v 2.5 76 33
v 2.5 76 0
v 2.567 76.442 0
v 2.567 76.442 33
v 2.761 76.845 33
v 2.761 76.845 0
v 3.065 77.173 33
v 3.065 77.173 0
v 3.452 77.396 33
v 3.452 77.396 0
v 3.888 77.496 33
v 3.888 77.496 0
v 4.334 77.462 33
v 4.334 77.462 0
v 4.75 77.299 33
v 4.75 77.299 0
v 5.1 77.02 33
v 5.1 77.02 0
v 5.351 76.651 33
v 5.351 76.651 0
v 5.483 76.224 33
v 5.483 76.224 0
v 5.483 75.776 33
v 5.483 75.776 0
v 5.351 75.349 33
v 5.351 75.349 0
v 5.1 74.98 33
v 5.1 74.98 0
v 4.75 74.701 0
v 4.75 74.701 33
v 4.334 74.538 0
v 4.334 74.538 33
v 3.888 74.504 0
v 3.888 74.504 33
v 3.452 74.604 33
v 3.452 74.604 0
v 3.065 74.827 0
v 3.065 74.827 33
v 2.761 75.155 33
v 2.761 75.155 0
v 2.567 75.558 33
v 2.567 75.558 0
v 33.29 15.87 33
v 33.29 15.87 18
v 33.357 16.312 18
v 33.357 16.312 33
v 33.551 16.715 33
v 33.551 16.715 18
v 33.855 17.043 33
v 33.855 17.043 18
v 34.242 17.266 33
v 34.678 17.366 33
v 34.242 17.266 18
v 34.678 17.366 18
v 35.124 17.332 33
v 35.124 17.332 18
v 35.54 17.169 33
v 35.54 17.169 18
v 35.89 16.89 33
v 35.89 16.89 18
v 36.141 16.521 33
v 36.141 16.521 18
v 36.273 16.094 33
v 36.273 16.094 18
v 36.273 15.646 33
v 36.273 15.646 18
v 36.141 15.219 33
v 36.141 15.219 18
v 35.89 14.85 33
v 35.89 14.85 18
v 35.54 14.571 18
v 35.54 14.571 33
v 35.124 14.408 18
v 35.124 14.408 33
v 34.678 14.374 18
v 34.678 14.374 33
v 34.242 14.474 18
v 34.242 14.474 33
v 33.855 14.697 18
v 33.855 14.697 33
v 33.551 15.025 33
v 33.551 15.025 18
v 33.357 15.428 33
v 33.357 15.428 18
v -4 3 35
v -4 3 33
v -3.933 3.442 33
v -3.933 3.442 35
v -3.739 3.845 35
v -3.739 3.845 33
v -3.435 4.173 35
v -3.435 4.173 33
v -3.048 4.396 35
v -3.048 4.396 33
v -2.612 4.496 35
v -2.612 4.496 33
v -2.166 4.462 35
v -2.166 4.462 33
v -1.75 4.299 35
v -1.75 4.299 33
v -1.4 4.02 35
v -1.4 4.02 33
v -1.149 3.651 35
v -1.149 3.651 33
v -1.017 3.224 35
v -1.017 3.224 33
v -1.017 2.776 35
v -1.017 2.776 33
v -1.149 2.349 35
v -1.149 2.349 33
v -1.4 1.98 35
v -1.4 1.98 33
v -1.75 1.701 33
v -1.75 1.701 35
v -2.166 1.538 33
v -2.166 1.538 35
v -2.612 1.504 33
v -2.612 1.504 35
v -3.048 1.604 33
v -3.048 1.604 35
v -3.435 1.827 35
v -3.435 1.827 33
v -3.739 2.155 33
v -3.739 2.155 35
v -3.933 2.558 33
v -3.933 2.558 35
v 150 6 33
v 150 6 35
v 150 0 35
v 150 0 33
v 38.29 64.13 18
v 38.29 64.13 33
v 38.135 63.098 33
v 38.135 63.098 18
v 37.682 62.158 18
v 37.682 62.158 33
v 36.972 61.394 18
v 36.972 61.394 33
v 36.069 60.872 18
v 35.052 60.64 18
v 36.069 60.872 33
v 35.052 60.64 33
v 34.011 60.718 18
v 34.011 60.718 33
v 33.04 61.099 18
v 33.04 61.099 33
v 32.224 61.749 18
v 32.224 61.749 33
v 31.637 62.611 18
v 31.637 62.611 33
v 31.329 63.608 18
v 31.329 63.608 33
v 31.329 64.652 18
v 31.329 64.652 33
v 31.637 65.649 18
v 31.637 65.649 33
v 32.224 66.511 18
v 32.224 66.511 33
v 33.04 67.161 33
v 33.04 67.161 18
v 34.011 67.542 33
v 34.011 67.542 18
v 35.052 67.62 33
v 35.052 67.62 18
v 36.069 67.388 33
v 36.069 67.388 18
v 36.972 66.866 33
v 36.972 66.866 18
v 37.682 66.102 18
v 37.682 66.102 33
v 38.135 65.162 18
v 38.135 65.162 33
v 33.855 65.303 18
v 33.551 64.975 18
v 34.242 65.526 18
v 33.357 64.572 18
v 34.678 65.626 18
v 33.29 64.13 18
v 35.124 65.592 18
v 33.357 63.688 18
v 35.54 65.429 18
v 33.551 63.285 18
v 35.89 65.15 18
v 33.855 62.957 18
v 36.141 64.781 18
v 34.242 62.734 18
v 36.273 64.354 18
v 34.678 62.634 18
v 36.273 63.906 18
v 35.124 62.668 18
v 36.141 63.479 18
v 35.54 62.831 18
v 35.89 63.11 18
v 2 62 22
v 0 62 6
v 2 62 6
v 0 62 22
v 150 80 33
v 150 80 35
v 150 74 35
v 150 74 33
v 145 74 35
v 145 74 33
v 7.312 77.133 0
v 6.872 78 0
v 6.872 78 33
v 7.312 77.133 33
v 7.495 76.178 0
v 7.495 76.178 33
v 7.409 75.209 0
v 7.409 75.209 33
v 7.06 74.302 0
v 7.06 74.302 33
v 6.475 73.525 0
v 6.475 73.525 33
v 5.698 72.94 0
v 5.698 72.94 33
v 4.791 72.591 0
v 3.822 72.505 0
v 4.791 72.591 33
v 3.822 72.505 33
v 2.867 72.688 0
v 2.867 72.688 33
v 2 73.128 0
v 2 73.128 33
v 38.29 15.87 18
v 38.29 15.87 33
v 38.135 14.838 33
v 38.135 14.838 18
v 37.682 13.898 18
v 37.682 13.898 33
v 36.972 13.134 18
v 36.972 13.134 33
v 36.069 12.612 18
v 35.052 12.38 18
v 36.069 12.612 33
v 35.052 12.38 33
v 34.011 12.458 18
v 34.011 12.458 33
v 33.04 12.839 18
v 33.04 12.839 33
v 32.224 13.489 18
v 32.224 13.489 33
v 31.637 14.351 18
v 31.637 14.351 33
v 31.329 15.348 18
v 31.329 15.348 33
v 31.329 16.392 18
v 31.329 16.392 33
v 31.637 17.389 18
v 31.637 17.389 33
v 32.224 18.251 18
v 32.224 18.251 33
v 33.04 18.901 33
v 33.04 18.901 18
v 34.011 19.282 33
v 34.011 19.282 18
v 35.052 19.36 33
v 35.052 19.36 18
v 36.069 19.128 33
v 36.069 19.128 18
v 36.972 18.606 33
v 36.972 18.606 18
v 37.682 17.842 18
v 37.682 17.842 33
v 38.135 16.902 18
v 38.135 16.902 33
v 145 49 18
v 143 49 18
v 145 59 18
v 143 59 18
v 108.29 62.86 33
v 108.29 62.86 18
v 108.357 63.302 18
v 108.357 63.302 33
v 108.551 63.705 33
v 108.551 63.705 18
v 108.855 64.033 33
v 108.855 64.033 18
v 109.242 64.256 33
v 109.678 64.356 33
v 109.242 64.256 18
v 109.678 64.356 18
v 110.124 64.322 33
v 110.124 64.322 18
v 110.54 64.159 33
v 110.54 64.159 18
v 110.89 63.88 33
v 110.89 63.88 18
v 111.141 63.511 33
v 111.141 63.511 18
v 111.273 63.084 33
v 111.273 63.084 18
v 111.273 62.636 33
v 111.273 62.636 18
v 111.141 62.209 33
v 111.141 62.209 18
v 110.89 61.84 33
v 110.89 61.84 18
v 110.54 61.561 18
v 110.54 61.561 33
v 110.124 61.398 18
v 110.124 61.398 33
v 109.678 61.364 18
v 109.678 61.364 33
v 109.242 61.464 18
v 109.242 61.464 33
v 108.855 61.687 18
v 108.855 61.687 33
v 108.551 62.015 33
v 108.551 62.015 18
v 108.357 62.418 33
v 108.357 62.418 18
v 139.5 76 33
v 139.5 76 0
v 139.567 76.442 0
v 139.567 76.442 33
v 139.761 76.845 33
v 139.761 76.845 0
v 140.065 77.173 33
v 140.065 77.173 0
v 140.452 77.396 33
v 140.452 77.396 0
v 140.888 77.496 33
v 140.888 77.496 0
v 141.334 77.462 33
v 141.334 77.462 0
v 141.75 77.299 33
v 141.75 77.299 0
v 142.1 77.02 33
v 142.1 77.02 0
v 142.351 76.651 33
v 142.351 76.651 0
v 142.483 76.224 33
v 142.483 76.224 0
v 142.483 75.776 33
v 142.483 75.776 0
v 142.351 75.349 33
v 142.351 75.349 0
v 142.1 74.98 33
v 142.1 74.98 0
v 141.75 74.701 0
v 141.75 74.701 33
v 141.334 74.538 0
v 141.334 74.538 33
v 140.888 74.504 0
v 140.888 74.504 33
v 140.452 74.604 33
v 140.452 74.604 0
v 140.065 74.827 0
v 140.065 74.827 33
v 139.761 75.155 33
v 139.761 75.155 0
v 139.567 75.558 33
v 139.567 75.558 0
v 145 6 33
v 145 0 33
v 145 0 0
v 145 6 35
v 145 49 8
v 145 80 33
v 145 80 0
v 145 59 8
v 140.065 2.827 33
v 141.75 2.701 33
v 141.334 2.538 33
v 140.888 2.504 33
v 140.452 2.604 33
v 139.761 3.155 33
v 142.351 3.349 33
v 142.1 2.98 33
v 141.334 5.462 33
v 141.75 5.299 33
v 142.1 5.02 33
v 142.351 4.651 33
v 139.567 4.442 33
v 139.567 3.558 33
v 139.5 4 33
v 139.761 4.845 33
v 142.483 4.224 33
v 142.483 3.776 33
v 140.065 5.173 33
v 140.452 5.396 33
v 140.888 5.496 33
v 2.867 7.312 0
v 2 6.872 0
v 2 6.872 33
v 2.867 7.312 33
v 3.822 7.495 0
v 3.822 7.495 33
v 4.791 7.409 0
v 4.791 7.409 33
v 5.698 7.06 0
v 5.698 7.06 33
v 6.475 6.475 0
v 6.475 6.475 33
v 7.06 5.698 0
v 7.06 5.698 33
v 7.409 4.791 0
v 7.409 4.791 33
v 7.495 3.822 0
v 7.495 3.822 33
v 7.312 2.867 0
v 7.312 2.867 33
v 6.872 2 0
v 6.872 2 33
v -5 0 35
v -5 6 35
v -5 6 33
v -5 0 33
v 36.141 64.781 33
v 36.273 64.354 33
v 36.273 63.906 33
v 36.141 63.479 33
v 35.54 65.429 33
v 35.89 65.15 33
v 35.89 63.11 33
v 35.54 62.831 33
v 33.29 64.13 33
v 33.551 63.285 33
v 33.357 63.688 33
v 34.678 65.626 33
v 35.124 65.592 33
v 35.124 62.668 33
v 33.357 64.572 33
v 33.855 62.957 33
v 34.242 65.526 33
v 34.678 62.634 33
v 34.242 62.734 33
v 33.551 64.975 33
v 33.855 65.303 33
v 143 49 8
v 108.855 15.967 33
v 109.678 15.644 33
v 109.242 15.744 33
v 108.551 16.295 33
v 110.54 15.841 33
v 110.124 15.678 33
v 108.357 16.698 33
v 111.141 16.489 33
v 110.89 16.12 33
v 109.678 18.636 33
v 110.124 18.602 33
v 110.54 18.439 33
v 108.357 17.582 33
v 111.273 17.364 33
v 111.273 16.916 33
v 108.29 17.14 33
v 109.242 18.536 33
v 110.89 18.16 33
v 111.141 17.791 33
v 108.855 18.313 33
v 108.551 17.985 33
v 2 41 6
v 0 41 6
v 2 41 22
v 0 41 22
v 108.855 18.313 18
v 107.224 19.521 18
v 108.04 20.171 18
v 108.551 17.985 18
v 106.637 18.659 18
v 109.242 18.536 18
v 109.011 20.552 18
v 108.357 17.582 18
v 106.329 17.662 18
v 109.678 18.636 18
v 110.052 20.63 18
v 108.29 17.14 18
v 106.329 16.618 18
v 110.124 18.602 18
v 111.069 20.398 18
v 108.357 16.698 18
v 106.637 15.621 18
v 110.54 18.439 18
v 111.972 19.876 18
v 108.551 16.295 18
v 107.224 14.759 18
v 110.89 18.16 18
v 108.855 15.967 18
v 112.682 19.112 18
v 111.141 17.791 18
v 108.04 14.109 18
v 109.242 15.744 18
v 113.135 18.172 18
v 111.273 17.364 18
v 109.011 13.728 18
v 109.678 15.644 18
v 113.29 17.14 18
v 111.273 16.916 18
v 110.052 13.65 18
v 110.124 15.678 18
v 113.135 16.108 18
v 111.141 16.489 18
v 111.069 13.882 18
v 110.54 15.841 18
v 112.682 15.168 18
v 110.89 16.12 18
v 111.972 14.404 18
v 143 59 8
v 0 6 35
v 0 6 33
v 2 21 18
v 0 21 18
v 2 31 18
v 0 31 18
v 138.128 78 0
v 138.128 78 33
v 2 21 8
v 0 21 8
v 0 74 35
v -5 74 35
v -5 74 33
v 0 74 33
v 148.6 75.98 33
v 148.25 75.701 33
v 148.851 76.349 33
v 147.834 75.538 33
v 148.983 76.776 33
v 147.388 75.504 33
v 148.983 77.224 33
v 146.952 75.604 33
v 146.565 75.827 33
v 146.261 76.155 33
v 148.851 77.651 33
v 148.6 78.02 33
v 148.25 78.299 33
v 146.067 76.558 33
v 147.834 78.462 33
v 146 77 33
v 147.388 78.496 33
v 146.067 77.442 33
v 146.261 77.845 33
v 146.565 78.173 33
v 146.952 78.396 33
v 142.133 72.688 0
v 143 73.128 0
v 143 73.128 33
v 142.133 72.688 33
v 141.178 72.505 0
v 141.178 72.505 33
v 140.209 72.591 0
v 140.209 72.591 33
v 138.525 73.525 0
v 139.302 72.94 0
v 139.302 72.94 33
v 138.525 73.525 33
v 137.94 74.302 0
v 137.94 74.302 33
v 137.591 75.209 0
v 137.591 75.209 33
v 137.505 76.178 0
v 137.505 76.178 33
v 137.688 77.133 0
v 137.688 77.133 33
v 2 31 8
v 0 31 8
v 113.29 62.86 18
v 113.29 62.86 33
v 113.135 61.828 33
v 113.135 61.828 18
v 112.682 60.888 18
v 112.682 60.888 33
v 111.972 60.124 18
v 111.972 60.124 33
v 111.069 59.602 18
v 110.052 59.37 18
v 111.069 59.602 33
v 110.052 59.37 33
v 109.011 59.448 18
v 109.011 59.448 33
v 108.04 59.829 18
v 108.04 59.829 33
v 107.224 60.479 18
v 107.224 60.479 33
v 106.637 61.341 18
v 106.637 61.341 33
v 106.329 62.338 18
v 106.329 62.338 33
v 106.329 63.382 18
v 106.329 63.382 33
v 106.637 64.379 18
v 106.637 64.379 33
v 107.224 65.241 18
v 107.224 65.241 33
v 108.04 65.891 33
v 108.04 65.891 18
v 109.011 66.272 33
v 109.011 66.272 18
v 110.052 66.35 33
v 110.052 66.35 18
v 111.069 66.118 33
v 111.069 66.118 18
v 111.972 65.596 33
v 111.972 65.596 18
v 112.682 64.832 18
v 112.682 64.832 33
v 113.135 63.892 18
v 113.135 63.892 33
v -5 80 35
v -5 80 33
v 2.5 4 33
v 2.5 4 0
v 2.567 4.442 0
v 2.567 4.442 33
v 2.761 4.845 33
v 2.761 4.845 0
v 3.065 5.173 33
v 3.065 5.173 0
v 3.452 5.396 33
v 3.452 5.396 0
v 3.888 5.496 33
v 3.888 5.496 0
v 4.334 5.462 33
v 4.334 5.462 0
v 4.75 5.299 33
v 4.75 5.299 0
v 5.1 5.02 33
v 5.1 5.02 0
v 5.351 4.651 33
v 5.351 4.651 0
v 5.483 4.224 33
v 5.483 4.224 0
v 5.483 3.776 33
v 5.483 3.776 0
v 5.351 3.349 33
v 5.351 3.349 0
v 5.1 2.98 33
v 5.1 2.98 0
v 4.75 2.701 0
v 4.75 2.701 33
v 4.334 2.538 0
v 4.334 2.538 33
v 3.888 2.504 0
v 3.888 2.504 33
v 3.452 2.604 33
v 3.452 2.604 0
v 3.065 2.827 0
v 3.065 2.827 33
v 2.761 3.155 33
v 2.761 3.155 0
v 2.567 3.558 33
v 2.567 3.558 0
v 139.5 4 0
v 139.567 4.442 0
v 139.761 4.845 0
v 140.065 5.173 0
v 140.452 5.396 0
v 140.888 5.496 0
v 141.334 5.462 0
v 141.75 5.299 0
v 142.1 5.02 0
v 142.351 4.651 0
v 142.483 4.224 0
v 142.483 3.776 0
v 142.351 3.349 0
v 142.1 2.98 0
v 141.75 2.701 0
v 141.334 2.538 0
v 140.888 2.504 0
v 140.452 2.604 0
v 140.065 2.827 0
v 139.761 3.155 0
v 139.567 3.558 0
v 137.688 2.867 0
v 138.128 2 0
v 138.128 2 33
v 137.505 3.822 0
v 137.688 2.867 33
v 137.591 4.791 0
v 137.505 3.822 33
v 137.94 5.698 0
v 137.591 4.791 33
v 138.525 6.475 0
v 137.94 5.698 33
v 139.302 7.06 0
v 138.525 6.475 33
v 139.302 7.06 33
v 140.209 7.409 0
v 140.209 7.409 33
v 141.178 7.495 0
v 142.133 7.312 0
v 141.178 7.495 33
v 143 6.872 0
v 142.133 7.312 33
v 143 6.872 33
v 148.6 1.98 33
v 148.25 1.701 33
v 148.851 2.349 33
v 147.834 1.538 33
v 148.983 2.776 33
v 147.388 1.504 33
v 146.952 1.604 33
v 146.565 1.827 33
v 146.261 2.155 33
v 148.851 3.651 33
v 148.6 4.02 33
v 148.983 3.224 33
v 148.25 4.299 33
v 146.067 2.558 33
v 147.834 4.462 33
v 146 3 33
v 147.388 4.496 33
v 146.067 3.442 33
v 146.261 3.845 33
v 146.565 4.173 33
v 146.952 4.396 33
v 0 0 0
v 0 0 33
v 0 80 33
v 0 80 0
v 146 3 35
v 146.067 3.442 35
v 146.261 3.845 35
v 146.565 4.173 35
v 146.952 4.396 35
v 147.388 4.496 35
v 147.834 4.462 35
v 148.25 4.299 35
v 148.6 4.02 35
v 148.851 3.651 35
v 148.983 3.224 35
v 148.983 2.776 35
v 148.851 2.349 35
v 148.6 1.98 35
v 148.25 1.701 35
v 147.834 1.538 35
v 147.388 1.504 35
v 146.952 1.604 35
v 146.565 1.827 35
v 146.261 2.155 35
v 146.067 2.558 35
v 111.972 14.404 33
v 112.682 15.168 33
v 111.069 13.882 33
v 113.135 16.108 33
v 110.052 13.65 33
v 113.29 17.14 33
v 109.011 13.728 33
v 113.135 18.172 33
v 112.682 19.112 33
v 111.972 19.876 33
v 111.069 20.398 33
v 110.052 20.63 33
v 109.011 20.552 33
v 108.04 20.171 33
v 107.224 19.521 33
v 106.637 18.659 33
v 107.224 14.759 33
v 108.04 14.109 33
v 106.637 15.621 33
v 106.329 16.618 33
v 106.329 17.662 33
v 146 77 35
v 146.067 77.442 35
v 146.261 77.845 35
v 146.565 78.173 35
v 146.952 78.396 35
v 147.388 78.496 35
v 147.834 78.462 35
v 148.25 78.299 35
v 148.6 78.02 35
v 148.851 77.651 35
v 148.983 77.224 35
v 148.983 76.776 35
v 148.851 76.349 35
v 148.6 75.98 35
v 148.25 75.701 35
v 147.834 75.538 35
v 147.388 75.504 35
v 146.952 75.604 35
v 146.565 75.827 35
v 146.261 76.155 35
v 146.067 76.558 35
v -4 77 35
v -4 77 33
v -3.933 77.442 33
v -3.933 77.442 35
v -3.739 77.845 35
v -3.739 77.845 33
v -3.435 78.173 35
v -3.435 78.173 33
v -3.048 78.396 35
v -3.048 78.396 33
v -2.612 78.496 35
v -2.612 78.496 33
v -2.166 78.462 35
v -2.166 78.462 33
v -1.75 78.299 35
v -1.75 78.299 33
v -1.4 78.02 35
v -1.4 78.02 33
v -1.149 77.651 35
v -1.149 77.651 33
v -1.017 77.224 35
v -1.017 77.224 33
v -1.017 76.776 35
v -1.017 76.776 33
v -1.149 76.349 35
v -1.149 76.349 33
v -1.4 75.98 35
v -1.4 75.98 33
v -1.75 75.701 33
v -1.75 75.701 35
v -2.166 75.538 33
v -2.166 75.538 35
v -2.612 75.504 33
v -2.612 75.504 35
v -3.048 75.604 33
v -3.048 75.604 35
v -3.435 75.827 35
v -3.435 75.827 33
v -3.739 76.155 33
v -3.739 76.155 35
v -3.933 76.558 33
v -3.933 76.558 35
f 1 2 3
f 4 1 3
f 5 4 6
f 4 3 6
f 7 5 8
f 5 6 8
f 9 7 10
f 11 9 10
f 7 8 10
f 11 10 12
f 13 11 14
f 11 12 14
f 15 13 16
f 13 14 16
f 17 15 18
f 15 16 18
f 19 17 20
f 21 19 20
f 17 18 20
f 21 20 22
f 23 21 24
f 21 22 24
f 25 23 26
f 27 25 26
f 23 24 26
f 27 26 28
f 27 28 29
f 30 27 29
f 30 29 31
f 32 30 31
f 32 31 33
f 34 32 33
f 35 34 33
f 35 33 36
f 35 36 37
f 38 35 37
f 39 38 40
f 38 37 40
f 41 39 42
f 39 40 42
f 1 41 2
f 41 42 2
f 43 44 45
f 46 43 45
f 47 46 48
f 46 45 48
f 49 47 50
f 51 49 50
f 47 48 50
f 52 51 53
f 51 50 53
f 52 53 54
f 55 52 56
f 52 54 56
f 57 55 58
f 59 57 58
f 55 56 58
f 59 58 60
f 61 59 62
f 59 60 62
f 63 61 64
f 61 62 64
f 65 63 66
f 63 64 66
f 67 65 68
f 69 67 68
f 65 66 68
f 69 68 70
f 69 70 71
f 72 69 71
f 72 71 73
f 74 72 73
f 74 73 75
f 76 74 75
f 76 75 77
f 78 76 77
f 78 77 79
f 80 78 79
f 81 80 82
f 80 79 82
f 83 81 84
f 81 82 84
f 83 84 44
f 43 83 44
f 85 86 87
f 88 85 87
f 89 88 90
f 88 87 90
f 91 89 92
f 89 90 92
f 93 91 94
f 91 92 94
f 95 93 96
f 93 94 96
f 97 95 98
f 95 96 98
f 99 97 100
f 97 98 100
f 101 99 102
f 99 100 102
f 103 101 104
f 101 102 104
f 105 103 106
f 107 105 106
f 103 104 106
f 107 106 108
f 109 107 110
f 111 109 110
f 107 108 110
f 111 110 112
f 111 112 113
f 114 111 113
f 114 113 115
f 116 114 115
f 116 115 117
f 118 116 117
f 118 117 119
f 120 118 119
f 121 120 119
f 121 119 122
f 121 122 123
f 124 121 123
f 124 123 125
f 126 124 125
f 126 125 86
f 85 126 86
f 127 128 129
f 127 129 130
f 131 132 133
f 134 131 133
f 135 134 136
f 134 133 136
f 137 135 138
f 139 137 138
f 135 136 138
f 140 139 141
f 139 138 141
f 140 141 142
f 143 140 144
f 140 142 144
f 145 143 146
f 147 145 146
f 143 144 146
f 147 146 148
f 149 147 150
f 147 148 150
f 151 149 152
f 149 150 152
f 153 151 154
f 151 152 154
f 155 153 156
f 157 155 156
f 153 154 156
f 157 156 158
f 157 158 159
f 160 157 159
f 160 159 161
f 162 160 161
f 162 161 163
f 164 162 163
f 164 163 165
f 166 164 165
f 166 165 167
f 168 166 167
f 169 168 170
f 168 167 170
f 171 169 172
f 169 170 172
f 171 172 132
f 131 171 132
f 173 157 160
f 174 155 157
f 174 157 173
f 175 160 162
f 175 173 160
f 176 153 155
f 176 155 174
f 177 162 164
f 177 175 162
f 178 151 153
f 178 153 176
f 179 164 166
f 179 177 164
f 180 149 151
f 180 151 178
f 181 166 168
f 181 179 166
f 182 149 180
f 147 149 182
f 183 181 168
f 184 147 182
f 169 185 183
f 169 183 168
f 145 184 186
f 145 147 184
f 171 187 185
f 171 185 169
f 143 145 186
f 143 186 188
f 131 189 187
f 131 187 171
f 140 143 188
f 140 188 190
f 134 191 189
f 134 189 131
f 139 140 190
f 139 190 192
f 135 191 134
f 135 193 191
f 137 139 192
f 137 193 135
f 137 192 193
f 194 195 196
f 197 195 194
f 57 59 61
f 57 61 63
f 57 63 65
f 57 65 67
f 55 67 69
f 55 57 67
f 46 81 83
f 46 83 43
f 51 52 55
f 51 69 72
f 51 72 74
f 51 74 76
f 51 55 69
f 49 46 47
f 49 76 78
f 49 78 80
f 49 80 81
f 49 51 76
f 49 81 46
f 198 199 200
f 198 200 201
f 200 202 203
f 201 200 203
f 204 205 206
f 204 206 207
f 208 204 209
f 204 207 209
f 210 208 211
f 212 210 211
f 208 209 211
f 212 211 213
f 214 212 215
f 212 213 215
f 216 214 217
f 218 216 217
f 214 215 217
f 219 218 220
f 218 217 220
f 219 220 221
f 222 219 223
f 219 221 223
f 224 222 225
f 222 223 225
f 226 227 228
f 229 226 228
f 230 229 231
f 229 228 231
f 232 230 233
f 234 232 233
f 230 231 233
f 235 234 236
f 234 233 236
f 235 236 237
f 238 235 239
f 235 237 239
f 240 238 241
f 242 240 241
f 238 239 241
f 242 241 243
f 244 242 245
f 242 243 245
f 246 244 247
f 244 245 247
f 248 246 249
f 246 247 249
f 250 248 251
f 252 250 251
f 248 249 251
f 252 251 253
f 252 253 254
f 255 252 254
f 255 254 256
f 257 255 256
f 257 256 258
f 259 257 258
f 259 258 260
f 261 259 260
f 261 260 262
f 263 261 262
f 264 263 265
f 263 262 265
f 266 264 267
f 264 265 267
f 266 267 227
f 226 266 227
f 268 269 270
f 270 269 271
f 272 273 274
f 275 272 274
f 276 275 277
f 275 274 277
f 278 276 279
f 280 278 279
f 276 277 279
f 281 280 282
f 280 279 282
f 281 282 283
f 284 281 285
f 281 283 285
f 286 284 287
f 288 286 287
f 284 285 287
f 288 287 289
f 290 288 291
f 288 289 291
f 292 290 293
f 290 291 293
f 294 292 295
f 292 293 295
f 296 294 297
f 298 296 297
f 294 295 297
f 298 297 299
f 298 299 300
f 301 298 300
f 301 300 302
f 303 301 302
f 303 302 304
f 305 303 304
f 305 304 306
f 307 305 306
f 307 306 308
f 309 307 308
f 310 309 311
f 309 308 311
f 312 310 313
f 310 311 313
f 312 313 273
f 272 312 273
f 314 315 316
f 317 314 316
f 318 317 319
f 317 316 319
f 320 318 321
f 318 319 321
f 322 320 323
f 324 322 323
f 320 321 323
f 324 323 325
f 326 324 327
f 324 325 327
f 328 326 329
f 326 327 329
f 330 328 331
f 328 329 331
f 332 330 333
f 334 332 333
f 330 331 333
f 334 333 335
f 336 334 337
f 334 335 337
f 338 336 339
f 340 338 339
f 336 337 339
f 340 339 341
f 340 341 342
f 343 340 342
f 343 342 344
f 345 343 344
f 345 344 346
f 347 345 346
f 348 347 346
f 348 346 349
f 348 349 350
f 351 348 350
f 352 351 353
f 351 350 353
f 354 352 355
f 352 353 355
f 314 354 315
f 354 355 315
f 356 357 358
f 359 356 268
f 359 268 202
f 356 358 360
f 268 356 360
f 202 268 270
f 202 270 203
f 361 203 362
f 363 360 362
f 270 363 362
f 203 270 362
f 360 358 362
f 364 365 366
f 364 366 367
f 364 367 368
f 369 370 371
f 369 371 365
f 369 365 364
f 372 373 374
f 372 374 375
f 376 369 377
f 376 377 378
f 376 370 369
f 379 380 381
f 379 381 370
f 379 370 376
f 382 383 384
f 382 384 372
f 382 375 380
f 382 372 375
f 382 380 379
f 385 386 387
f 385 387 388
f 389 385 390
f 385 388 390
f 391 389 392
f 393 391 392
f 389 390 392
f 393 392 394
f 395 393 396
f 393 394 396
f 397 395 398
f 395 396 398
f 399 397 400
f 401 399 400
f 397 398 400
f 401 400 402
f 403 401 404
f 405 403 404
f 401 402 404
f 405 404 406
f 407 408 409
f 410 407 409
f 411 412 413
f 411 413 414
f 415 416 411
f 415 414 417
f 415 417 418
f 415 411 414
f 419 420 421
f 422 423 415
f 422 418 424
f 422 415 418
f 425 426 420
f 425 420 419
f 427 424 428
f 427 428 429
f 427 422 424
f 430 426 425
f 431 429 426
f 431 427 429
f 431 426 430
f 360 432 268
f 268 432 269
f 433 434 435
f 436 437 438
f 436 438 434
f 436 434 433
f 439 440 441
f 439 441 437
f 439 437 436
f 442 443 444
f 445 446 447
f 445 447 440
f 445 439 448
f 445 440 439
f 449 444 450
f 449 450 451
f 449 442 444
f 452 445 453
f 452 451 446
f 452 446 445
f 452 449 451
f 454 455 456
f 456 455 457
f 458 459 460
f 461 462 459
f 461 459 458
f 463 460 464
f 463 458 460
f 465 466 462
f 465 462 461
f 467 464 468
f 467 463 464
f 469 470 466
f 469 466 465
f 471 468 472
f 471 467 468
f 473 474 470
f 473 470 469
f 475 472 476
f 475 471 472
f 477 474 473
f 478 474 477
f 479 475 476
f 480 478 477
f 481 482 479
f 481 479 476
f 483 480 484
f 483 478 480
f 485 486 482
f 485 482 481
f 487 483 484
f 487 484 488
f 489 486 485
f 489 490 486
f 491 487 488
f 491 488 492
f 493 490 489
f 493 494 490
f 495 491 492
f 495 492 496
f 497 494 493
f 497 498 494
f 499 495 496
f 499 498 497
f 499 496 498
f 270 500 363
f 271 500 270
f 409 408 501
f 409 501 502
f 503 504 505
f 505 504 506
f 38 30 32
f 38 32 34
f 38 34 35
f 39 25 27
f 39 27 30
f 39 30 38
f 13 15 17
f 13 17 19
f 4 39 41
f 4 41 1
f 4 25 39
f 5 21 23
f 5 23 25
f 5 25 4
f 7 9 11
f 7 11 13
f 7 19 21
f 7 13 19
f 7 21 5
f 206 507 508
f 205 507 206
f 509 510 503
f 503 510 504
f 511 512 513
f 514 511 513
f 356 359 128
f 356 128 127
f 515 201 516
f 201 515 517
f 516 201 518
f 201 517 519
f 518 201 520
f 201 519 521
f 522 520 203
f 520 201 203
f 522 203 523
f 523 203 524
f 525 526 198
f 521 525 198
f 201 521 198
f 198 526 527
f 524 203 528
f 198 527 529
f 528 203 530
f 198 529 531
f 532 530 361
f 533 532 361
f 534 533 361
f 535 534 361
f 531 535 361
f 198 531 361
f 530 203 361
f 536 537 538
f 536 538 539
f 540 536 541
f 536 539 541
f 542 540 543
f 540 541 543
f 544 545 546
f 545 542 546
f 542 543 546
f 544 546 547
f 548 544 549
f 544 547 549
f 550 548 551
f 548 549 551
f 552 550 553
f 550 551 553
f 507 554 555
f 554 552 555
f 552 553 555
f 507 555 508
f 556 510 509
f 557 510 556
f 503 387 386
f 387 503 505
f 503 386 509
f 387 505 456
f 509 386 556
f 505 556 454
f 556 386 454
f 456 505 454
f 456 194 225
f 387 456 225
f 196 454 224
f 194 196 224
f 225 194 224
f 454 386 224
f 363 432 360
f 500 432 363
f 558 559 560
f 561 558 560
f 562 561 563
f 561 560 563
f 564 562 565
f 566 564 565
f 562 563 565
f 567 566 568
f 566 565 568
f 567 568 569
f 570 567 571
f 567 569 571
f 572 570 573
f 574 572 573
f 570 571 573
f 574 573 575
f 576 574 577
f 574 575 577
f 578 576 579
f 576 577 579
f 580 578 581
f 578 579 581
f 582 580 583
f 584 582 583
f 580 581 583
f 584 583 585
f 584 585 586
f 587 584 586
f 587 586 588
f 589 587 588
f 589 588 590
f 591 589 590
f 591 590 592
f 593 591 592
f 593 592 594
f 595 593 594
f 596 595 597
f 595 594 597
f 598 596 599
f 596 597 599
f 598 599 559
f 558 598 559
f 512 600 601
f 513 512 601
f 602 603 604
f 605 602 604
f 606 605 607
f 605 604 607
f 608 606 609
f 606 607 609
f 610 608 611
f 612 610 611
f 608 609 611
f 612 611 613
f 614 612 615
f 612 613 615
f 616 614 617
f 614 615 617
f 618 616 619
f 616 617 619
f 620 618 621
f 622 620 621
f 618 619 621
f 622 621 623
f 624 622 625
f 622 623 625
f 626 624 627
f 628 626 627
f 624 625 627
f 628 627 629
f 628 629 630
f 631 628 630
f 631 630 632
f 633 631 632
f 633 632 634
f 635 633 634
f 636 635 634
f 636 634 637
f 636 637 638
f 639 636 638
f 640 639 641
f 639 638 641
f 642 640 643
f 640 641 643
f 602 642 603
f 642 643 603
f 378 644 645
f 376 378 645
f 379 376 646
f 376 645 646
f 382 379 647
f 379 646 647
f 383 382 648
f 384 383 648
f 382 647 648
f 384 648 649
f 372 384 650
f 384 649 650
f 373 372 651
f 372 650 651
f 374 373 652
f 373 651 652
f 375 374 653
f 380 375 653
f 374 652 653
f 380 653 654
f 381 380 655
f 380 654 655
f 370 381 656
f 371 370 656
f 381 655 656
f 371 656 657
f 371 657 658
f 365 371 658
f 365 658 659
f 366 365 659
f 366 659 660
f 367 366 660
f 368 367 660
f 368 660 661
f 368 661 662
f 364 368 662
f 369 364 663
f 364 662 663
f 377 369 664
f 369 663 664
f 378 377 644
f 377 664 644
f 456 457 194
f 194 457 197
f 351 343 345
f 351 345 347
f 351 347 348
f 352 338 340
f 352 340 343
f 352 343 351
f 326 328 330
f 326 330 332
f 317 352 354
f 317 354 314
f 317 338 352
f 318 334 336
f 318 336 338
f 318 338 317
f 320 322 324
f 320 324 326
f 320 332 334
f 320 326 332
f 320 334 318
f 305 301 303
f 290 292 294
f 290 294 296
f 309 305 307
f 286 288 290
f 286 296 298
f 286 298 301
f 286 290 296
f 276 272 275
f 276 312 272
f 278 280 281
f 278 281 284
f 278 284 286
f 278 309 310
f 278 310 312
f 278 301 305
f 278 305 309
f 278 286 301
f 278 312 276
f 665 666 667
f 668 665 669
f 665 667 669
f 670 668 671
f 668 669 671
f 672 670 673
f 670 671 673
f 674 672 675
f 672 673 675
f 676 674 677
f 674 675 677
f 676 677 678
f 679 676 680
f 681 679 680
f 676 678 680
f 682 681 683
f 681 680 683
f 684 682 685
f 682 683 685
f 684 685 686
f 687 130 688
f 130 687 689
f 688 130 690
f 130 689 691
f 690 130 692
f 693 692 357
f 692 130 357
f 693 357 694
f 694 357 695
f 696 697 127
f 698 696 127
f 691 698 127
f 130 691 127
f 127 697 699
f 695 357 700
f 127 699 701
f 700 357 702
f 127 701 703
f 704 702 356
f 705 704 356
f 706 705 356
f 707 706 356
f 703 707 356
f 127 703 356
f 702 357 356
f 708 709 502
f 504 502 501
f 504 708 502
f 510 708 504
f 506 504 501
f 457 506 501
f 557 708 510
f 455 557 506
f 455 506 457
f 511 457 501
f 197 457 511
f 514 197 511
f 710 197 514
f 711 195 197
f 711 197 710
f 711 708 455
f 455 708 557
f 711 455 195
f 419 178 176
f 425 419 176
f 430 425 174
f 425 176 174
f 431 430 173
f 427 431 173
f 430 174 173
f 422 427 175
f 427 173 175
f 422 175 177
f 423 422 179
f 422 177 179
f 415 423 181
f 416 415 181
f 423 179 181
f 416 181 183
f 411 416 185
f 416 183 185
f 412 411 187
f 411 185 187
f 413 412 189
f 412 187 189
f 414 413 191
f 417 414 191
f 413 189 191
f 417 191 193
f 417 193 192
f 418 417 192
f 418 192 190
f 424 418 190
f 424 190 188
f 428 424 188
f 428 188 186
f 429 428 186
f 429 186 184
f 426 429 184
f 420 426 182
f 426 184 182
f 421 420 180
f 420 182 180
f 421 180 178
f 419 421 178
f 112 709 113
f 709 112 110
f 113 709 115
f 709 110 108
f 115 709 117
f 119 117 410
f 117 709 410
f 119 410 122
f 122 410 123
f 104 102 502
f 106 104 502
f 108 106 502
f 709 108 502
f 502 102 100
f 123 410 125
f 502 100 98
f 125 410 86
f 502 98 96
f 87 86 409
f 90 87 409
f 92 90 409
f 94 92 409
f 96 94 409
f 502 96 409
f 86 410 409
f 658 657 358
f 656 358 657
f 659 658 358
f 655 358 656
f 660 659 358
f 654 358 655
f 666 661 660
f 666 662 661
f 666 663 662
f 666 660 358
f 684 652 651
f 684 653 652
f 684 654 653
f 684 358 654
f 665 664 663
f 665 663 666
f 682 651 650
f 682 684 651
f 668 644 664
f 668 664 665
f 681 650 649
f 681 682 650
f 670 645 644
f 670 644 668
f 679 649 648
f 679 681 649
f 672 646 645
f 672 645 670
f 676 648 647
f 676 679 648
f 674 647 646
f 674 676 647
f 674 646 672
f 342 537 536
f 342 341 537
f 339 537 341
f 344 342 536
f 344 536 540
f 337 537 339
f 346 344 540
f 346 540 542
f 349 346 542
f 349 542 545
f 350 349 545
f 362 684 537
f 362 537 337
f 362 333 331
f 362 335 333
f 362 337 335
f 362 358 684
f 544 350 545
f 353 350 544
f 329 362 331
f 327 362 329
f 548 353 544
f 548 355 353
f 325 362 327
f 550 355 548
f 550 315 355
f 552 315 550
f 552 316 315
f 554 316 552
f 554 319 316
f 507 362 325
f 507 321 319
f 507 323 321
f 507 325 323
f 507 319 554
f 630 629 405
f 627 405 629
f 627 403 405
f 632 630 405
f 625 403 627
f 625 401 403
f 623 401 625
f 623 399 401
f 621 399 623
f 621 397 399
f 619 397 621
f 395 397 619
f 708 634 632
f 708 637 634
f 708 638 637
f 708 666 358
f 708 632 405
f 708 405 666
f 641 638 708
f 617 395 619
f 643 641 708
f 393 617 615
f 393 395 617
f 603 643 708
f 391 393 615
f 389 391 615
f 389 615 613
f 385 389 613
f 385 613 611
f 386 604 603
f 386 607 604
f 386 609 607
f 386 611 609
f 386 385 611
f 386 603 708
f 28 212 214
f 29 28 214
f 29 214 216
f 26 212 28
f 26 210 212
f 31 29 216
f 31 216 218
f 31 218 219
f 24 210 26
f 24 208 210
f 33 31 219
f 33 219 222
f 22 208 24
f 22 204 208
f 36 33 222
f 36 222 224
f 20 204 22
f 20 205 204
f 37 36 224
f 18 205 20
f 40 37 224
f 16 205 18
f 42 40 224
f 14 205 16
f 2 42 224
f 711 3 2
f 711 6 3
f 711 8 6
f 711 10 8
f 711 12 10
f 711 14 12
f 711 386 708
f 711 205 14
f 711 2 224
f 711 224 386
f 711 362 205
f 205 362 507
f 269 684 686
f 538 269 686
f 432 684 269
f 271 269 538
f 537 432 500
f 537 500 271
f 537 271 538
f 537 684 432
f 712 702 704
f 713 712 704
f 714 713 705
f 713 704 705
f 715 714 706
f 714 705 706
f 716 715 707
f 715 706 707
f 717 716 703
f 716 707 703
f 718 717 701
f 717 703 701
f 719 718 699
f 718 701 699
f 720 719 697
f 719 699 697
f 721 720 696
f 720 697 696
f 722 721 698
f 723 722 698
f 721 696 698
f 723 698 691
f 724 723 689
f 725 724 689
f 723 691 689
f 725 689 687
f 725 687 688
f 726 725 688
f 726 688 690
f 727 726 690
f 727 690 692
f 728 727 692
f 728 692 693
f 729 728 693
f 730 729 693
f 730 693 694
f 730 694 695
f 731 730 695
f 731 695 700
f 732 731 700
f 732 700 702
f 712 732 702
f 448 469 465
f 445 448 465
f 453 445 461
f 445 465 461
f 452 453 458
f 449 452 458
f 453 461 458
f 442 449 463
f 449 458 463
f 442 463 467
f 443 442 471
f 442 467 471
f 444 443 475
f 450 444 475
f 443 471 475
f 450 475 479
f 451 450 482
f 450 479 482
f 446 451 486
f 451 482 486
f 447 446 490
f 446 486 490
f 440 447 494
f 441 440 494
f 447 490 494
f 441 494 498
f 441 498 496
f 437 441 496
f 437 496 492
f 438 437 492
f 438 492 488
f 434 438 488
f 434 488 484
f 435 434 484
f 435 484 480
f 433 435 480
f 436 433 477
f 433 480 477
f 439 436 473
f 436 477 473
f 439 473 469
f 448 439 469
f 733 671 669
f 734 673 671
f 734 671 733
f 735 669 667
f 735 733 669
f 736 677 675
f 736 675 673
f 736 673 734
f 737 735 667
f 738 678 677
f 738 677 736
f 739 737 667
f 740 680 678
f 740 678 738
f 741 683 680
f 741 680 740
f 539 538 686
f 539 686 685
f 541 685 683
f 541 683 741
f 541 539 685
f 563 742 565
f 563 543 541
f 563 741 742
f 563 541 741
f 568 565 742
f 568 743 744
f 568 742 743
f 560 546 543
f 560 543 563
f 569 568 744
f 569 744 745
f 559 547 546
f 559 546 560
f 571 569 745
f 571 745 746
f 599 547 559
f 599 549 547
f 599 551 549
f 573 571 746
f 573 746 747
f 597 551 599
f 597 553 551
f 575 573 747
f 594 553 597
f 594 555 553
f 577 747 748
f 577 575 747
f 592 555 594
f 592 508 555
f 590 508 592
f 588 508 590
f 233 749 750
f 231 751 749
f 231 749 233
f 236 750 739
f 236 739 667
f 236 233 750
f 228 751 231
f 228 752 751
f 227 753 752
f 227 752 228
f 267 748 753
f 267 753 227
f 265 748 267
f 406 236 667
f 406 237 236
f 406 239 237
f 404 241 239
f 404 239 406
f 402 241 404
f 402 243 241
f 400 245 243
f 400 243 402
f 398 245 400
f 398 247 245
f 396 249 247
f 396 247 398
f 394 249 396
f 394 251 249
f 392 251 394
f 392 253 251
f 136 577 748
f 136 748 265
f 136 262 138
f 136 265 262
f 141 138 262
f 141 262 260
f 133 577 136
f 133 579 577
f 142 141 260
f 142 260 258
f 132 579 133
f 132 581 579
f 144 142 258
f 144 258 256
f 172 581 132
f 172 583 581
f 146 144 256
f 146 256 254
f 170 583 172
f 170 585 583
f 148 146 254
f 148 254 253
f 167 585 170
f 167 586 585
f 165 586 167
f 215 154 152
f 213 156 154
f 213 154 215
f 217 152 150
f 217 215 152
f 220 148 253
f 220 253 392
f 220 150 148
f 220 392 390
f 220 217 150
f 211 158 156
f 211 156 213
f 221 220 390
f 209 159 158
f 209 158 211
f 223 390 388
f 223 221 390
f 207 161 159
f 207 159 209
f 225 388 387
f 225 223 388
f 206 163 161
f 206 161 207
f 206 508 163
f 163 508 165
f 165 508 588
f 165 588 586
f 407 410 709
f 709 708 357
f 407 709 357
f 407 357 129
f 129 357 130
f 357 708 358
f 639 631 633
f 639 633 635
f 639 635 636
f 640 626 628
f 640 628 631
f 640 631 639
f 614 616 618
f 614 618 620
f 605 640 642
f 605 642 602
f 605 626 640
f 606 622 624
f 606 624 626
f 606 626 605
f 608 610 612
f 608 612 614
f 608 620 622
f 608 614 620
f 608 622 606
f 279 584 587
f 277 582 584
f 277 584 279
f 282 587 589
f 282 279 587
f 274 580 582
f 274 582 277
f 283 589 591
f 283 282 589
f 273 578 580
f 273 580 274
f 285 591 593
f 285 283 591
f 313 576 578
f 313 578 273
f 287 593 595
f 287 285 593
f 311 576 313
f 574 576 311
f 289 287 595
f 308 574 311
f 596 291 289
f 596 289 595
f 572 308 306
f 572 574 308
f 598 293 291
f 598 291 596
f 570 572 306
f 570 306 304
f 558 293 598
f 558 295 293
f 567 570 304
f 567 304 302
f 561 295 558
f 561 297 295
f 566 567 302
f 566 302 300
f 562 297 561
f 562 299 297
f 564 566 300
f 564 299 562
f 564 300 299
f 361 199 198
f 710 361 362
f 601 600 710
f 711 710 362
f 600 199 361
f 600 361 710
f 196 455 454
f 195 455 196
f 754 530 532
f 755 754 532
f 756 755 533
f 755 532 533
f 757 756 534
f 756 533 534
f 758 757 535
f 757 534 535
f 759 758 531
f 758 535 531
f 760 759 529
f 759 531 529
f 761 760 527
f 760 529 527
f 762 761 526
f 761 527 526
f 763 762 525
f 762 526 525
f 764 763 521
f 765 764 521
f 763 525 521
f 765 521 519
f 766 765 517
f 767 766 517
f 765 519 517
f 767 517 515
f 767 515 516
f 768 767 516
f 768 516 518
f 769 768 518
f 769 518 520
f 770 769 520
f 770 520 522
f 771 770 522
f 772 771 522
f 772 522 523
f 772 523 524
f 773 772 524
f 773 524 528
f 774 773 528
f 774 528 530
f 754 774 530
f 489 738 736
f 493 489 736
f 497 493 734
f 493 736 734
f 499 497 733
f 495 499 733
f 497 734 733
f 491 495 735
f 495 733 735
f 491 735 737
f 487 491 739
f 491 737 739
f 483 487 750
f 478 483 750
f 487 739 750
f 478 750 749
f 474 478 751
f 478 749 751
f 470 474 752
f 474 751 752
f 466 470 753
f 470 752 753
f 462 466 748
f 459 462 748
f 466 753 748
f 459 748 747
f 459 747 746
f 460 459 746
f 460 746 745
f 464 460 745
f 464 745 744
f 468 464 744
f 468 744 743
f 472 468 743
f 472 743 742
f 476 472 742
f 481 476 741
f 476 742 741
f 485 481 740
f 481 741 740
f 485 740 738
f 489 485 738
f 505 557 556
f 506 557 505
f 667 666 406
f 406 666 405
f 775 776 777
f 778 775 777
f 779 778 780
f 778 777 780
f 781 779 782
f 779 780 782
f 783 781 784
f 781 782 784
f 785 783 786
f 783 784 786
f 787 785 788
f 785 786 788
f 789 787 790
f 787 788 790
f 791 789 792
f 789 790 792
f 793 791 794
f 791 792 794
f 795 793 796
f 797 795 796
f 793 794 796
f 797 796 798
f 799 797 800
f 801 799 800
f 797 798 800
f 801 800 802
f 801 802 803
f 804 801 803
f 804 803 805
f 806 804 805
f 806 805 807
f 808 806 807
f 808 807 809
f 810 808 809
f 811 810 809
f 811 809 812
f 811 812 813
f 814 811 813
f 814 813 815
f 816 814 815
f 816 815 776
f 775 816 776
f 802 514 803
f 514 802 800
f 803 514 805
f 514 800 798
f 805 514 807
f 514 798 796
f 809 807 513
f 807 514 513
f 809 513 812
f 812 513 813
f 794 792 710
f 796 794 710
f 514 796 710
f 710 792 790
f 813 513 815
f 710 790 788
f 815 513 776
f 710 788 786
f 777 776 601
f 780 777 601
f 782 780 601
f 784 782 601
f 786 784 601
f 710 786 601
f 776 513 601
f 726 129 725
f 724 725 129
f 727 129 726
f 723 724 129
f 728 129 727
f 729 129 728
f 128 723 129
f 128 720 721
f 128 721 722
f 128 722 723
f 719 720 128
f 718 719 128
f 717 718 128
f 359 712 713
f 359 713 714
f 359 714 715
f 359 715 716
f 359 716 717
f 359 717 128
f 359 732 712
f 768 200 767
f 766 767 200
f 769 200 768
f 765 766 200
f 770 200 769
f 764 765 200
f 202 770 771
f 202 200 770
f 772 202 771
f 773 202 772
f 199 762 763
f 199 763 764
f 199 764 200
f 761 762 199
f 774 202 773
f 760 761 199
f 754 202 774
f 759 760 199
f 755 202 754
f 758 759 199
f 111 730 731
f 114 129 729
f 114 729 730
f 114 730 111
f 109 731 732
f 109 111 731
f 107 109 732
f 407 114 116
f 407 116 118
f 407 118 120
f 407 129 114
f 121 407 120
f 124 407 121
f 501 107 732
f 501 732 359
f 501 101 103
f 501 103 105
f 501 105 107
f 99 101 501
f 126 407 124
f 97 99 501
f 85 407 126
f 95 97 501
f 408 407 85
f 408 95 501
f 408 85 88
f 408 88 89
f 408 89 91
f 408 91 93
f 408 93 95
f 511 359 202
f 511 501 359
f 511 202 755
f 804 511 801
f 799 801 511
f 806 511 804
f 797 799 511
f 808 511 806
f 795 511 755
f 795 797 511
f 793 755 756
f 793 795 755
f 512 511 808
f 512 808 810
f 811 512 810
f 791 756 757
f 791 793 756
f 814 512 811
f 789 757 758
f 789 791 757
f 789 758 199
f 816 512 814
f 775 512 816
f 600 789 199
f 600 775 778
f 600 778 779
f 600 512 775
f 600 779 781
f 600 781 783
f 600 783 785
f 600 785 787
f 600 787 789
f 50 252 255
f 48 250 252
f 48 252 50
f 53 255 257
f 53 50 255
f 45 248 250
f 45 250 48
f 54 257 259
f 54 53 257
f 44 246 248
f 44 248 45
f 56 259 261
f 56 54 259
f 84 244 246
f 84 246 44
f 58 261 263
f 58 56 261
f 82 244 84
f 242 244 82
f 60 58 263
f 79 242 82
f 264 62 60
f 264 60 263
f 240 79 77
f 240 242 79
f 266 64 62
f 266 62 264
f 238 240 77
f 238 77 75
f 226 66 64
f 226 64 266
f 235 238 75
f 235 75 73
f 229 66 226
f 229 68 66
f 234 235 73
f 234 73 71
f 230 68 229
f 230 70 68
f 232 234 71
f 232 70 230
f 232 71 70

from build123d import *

# Parameters (mm, degrees)
SKETCH_1_W                       = 145
SKETCH_1_H                       = 80
EXTRUDE_1_DEPTH                  = 35
SKETCH_2_W                       = 141
SKETCH_2_H                       = 76
CUT_EXTRUDE_1_DEPTH              = 33
SKETCH_3_R                       = 3.5
EXTRUDE_2_DEPTH                  = 15
SKETCH_4_R                       = 1.5
CUT_EXTRUDE_2_DEPTH              = 15
SKETCH_5_W                       = 10
SKETCH_5_H                       = 10
SKETCH_5_W_2                     = 16
SKETCH_5_H_2                     = 21
CUT_EXTRUDE_3_DEPTH              = 15
SKETCH_6_W                       = 10
SKETCH_6_H                       = 10
CUT_EXTRUDE_4_DEPTH              = 15
SKETCH_9_R                       = 3.5
EXTRUDE_3_DEPTH                  = 33
SKETCH_10_R                      = 1.5
CUT_EXTRUDE_5_DEPTH              = 33
PATTERN_LINEAR_2_COUNT           = 2
PATTERN_LINEAR_2_PITCH           = 72
PATTERN_LINEAR_2_COUNT_DIR2      = 2
PATTERN_LINEAR_2_PITCH_DIR2      = 137
SKETCH_12_W                      = 2
SKETCH_12_H                      = 6
EXTRUDE_4_DEPTH                  = 5
SKETCH_13_R                      = 1.5
CUT_EXTRUDE_6_DEPTH              = 5
PATTERN_LINEAR_3_COUNT           = 2
PATTERN_LINEAR_3_PITCH           = 74
PATTERN_LINEAR_4_COUNT           = 2
PATTERN_LINEAR_4_PITCH           = 150
PATTERN_LINEAR_4_COPY_1_SKETCH_R = 1.5
PATTERN_LINEAR_4_COPY_1_DEPTH    = 5


with BuildPart() as part:
    # Эскиз1 → Бобышка-Вытянуть1 (new body)
    with BuildSketch(Plane.XY):
        with Locations((72.5, 40)):
            Rectangle(SKETCH_1_W, SKETCH_1_H)
    extrude(amount=EXTRUDE_1_DEPTH)

    # Эскиз2 → Вырез-Вытянуть1 (cut)
    with BuildSketch(Plane(origin=(0, 0, 0), x_dir=(-1, 0, 0), z_dir=(0, 0, -1))):
        with Locations((-72.5, 40)):
            Rectangle(SKETCH_2_W, SKETCH_2_H)
    extrude(amount=-CUT_EXTRUDE_1_DEPTH, mode=Mode.SUBTRACT)

    # Эскиз3 → Бобышка-Вытянуть2 (add)
    with BuildSketch(Plane(origin=(0, 0, 33), x_dir=(-1, 0, 0), z_dir=(0, 0, -1))):
        with Locations(Location((-109.79, 62.86, 0), (0, 0, 180))):
            Circle(SKETCH_3_R)
        with Locations(Location((-109.79, 17.14, 0), (0, 0, 180))):
            Circle(SKETCH_3_R)
        with Locations(Location((-34.79, 64.13, 0), (0, 0, 180))):
            Circle(SKETCH_3_R)
        with Locations(Location((-34.79, 15.87, 0), (0, 0, 180))):
            Circle(SKETCH_3_R)
    extrude(amount=EXTRUDE_2_DEPTH)

    # Эскиз4 → Вырез-Вытянуть2 (cut)
    with BuildSketch(Plane(origin=(0, 0, 18), x_dir=(-1, 0, 0), z_dir=(0, 0, -1))):
        with Locations((-109.79, 62.86)):
            Circle(SKETCH_4_R)
        with Locations((-34.79, 64.13)):
            Circle(SKETCH_4_R)
        with Locations((-34.79, 15.87)):
            Circle(SKETCH_4_R)
        with Locations((-109.79, 17.14)):
            Circle(SKETCH_4_R)
    extrude(amount=-CUT_EXTRUDE_2_DEPTH, mode=Mode.SUBTRACT)

    # Эскиз5 → Вырез-Вытянуть3 (cut)
    with BuildSketch(Plane.ZY):
        with Locations((13, 26)):
            Rectangle(SKETCH_5_W, SKETCH_5_H)
        with Locations((14, 51.5)):
            Rectangle(SKETCH_5_W_2, SKETCH_5_H_2)
    extrude(amount=-CUT_EXTRUDE_3_DEPTH, mode=Mode.SUBTRACT)

    # Эскиз6 → Вырез-Вытянуть4 (cut)
    with BuildSketch(Plane.ZY.offset(-143)):
        with Locations((13, 54)):
            Rectangle(SKETCH_6_W, SKETCH_6_H)
    extrude(amount=-CUT_EXTRUDE_4_DEPTH, mode=Mode.SUBTRACT)

    # Эскиз9 → Бобышка-Вытянуть3 (add)
    with BuildSketch(Plane(origin=(0, 0, 33), x_dir=(-1, 0, 0), z_dir=(0, 0, -1))):
        with Locations((-4, 76)):
            Circle(SKETCH_9_R)
    extrude_3 = extrude(amount=EXTRUDE_3_DEPTH)

    # Эскиз10 → Вырез-Вытянуть5 (cut)
    with BuildSketch(Plane(origin=(0, 0, 0), x_dir=(-1, 0, 0), z_dir=(0, 0, -1))):
        with Locations((-4, 76)):
            Circle(SKETCH_10_R)
    cut_extrude_5 = extrude(amount=-CUT_EXTRUDE_5_DEPTH, mode=Mode.SUBTRACT)

    # Линейный массив2: Бобышка-Вытянуть3, Cut-Extrude 5 2 × 2
    with Locations(*[(j * PATTERN_LINEAR_2_PITCH_DIR2, -i * PATTERN_LINEAR_2_PITCH, 0) for i in range(PATTERN_LINEAR_2_COUNT) for j in range(PATTERN_LINEAR_2_COUNT_DIR2) if (i, j) != (0, 0)]):
        add(extrude_3)
        add(cut_extrude_5, mode=Mode.SUBTRACT)

    # Эскиз12 → Бобышка-Вытянуть4 (add)
    with BuildSketch(Plane(origin=(145, 0, 0), x_dir=(0, 0, -1), z_dir=(1, 0, 0))):
        with Locations((-34, 77)):
            Rectangle(SKETCH_12_W, SKETCH_12_H)
        with Locations((-34, 3)):
            Rectangle(SKETCH_12_W, SKETCH_12_H)
    extrude_4 = extrude(amount=EXTRUDE_4_DEPTH)

    # Эскиз13 → Вырез-Вытянуть6 (cut)
    with BuildSketch(Plane(origin=(0, 0, 33), x_dir=(-1, 0, 0), z_dir=(0, 0, -1))):
        with Locations((-147.5, 77)):
            Circle(SKETCH_13_R)
    cut_extrude_6 = extrude(amount=-CUT_EXTRUDE_6_DEPTH, mode=Mode.SUBTRACT)

    # Линейный массив3: Вырез-Вытянуть6 ×2
    with Locations(*[(0, -i * PATTERN_LINEAR_3_PITCH, 0) for i in range(1, PATTERN_LINEAR_3_COUNT)]):
        add(cut_extrude_6, mode=Mode.SUBTRACT)

    # Линейный массив4: Бобышка-Вытянуть4, Вырез-Вытянуть6 ×2
    with Locations(*[(-i * PATTERN_LINEAR_4_PITCH, 0, 0) for i in range(1, PATTERN_LINEAR_4_COUNT)]):
        add(extrude_4)
        add(cut_extrude_6, mode=Mode.SUBTRACT)

    # Линейный массив4 copy 1 sketch → Линейный массив4 copy 1 (cut)
    with BuildSketch(Plane(origin=(-150, -74, 33), x_dir=(-1, 0, 0), z_dir=(0, 0, -1))):
        with Locations((-147.5, 77)):
            Circle(PATTERN_LINEAR_4_COPY_1_SKETCH_R)
    extrude(amount=-PATTERN_LINEAR_4_COPY_1_DEPTH, mode=Mode.SUBTRACT)


solid = part.part
